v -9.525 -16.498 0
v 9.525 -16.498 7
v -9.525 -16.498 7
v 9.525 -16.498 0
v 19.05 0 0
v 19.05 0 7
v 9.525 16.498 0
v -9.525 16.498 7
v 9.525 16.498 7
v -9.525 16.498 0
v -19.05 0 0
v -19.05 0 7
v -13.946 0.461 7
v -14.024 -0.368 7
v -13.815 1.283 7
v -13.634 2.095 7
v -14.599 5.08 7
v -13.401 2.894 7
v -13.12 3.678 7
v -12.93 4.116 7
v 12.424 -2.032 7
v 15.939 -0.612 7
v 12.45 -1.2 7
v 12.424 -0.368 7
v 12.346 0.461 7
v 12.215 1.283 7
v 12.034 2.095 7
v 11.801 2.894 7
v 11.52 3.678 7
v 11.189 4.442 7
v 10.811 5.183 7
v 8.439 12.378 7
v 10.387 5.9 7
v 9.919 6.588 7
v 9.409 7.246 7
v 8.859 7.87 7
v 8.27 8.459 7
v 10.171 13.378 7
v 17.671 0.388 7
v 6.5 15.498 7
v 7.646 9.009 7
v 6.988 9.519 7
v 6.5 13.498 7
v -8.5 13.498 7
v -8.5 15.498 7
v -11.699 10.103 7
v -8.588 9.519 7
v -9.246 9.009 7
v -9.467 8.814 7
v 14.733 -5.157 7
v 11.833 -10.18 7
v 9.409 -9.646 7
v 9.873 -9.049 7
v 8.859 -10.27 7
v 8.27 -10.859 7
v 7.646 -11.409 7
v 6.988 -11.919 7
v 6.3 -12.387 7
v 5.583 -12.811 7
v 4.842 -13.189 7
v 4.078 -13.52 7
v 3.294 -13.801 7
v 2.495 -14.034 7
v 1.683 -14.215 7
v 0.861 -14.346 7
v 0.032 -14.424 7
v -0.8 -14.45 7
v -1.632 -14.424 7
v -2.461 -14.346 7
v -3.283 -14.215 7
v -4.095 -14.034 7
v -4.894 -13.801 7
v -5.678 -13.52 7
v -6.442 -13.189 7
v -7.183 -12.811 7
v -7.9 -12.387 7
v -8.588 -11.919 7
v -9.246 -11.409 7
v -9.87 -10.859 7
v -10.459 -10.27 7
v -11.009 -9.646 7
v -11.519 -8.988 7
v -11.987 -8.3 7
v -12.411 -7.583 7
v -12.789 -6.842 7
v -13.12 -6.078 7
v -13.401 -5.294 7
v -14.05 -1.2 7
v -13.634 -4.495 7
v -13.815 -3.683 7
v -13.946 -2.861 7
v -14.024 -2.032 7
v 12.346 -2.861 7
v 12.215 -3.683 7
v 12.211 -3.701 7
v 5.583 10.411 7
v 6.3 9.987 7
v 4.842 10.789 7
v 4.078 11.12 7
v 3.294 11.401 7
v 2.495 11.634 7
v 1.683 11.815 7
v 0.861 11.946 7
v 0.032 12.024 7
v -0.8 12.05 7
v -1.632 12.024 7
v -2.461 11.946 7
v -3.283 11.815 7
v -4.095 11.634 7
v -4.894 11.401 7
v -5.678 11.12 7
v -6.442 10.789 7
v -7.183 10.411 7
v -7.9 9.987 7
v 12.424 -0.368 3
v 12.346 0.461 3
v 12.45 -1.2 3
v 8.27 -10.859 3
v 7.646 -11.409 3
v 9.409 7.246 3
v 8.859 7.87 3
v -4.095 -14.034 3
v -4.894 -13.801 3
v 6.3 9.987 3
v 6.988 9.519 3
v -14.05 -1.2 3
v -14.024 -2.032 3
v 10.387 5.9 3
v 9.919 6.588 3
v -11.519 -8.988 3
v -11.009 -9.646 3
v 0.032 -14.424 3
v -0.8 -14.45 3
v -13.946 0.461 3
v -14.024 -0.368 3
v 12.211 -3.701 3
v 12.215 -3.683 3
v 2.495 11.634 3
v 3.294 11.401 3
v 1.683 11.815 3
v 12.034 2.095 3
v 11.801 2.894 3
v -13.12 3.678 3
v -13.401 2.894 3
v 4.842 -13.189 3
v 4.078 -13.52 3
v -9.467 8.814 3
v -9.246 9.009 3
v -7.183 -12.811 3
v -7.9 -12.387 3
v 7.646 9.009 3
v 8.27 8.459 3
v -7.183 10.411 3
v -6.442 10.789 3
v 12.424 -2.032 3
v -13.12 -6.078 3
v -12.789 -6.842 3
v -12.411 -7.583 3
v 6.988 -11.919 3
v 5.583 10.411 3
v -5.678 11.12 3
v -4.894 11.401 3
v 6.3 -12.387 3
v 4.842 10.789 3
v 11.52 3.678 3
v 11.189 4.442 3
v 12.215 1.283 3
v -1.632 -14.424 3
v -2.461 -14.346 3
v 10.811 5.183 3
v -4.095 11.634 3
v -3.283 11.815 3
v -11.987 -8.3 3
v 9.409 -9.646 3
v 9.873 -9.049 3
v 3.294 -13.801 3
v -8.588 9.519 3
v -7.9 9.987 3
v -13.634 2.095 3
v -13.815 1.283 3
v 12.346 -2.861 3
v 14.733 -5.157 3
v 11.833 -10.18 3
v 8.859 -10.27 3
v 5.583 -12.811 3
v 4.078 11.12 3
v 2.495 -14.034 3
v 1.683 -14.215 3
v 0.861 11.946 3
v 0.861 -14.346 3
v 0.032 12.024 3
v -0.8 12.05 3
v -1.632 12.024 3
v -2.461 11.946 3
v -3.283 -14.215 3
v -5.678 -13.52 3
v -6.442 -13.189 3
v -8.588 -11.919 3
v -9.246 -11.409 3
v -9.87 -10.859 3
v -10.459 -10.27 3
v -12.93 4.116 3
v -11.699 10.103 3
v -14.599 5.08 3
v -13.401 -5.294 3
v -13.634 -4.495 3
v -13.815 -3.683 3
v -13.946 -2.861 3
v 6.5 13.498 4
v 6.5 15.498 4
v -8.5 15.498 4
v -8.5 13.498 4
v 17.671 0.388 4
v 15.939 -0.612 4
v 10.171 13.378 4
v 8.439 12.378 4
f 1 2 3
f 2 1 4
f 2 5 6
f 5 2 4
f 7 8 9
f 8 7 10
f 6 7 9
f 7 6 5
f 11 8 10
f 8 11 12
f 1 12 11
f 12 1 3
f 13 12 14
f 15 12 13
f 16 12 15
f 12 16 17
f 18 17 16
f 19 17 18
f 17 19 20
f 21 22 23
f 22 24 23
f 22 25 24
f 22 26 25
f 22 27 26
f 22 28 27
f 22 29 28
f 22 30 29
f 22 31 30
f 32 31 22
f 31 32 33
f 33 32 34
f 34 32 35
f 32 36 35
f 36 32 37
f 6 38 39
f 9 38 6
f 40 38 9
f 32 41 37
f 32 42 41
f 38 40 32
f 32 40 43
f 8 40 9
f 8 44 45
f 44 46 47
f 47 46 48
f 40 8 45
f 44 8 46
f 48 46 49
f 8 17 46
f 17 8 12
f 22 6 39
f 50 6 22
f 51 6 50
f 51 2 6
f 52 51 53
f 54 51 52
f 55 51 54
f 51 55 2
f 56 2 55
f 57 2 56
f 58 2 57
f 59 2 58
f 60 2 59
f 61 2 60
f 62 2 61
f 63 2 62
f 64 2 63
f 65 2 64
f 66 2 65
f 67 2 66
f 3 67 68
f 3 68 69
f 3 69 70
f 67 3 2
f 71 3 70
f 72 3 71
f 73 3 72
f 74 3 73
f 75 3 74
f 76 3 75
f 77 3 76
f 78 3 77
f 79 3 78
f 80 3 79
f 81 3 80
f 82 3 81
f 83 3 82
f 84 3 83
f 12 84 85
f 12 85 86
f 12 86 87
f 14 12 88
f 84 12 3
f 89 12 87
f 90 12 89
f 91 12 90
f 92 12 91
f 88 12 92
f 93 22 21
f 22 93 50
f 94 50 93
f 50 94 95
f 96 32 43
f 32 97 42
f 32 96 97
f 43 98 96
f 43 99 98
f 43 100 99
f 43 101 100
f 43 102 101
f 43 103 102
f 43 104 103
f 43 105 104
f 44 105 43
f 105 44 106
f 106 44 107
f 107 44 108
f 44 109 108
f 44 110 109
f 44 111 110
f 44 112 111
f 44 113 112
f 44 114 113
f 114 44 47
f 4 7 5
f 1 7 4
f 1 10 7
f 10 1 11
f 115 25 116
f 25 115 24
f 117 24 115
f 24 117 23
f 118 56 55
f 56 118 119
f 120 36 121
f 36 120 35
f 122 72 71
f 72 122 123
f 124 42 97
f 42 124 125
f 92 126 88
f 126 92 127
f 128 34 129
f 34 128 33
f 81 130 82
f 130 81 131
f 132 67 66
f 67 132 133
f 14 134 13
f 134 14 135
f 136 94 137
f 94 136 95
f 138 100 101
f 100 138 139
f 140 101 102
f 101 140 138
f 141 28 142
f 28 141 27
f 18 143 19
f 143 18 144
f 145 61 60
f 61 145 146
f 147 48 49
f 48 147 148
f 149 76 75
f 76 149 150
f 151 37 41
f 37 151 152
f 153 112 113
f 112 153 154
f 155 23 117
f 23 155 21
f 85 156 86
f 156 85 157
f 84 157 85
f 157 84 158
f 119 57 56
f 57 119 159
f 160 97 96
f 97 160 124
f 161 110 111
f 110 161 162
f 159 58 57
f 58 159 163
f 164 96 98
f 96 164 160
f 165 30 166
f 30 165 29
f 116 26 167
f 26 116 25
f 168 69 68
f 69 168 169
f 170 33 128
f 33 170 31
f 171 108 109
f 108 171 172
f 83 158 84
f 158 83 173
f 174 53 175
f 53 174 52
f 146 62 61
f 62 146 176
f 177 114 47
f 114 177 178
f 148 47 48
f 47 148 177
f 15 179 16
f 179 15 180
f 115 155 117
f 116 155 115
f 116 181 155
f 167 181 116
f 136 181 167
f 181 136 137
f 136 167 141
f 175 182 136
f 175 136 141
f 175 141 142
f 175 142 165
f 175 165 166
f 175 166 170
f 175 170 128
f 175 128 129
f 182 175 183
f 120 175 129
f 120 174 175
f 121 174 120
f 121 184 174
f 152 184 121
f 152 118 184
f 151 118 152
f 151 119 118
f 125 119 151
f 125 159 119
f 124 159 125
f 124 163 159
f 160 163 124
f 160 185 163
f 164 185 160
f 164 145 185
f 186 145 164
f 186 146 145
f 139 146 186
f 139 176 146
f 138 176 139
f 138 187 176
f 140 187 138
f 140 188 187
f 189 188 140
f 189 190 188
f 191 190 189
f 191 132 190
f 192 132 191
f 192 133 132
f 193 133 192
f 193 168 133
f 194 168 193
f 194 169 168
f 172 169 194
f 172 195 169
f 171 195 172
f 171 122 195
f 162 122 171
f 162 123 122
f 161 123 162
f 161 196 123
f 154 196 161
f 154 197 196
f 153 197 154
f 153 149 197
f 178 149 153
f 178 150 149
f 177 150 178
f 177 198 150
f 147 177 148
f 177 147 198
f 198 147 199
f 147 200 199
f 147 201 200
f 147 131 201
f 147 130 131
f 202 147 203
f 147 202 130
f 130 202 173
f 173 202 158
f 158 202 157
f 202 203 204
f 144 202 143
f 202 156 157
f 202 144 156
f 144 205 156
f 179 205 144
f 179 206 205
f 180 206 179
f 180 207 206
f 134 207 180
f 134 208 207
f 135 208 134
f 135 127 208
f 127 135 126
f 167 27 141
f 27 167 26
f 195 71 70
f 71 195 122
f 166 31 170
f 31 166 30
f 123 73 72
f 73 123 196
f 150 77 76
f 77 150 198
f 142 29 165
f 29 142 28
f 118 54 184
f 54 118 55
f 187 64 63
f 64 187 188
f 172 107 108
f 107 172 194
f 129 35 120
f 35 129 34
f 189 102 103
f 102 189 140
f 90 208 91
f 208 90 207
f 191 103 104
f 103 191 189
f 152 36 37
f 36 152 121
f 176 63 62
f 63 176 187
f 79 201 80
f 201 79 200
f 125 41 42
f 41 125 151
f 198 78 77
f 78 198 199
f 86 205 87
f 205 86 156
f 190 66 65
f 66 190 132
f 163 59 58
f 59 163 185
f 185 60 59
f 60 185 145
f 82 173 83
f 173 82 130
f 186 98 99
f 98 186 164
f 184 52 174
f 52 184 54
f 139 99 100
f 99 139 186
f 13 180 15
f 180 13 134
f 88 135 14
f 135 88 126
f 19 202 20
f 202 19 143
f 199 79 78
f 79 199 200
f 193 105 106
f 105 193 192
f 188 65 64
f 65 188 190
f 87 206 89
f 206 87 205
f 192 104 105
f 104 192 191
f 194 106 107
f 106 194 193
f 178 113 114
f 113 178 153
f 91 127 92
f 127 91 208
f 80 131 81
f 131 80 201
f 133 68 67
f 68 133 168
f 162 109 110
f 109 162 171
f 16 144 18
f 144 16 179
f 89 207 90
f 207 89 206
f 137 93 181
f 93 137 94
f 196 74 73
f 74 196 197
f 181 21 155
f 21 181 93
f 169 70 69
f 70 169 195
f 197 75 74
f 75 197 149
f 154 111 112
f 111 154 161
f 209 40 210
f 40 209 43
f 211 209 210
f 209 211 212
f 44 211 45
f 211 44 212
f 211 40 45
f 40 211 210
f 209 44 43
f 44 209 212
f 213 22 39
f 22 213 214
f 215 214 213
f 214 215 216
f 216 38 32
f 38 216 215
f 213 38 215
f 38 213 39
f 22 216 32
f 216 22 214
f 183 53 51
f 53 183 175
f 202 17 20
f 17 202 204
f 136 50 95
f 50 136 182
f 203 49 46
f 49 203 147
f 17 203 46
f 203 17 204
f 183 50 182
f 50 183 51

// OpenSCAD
// Written by xoque (mwifall@gmail.com)
/**************************************
Gloomhaven miniature holder with condition tile holders

I created this so we could see what conditions our characters had while viewing the game board.  I would always forgot to look at my character mat to look for conditions.  I found that the diameter of the miniature bases have small differences, and I had to adjust them slightly to get them to work well, otherwise it was too loose.

**************************************/

// This is the diameter of the inner cylinder
// 27 worked well for SpellWeaver
// 26.6 worked well for me for the Brute
MiniDiameter=26.5;

// Hexagon Diameter
HexDiameter=38.1;
// Length of half the hexagon from end to end
HexHalfLength=sqrt((pow(HexDiameter,2))-(pow(HexDiameter/2,2)));
// Hexagon Height
HexHeight=7;
HexBaseHeight=3;

// Condition Cutout
CutoutHeight=3;
ConditionLength=15;

difference() {
    
    union() {
        //The Base Hexagon
        cylinder(h=HexHeight,r=HexDiameter/2,$fn=6);
        //The condition holders
        rotate([0,0,-60]) {
            translate([-HexDiameter/4+(HexDiameter/4-ConditionLength/2),sqrt(pow(HexDiameter/2,2)-pow(HexDiameter/4,2))-3,HexHeight-CutoutHeight]) {
                color("red")
                    cube([ConditionLength,2,CutoutHeight]);
        }
    }
}
    translate([-0.8,-1.2,HexBaseHeight])
        cylinder(h=HexHeight-HexBaseHeight,d=MiniDiameter,$fn=100);
    translate([-HexDiameter/4+(HexDiameter/4-ConditionLength/2)-1,sqrt(pow(HexDiameter/2,2)-pow(HexDiameter/4,2))-3,HexHeight-CutoutHeight]) {
        rotate([0,0,0]) {
            color("red")
                cube([ConditionLength,2,CutoutHeight]);
        }
    }
    rotate([0,0,-60]) {
        translate([-HexDiameter/4+(HexDiameter/4-ConditionLength/2)+1,sqrt(pow(HexDiameter/2,2)-pow(HexDiameter/4,2))-3,HexHeight-CutoutHeight]) {
            color("red")
                cube([ConditionLength,2,CutoutHeight]);
            }
    }
    rotate([0,0,-120]) {
        translate([-(HexDiameter-MiniDiameter)/4,-(HexDiameter/2)+(HexDiameter-MiniDiameter)/3,HexBaseHeight]) {
            color("green")
                cube([(HexDiameter-MiniDiameter)/2,(HexHalfLength*.925), HexHeight-HexBaseHeight]);
        }
    }
}
